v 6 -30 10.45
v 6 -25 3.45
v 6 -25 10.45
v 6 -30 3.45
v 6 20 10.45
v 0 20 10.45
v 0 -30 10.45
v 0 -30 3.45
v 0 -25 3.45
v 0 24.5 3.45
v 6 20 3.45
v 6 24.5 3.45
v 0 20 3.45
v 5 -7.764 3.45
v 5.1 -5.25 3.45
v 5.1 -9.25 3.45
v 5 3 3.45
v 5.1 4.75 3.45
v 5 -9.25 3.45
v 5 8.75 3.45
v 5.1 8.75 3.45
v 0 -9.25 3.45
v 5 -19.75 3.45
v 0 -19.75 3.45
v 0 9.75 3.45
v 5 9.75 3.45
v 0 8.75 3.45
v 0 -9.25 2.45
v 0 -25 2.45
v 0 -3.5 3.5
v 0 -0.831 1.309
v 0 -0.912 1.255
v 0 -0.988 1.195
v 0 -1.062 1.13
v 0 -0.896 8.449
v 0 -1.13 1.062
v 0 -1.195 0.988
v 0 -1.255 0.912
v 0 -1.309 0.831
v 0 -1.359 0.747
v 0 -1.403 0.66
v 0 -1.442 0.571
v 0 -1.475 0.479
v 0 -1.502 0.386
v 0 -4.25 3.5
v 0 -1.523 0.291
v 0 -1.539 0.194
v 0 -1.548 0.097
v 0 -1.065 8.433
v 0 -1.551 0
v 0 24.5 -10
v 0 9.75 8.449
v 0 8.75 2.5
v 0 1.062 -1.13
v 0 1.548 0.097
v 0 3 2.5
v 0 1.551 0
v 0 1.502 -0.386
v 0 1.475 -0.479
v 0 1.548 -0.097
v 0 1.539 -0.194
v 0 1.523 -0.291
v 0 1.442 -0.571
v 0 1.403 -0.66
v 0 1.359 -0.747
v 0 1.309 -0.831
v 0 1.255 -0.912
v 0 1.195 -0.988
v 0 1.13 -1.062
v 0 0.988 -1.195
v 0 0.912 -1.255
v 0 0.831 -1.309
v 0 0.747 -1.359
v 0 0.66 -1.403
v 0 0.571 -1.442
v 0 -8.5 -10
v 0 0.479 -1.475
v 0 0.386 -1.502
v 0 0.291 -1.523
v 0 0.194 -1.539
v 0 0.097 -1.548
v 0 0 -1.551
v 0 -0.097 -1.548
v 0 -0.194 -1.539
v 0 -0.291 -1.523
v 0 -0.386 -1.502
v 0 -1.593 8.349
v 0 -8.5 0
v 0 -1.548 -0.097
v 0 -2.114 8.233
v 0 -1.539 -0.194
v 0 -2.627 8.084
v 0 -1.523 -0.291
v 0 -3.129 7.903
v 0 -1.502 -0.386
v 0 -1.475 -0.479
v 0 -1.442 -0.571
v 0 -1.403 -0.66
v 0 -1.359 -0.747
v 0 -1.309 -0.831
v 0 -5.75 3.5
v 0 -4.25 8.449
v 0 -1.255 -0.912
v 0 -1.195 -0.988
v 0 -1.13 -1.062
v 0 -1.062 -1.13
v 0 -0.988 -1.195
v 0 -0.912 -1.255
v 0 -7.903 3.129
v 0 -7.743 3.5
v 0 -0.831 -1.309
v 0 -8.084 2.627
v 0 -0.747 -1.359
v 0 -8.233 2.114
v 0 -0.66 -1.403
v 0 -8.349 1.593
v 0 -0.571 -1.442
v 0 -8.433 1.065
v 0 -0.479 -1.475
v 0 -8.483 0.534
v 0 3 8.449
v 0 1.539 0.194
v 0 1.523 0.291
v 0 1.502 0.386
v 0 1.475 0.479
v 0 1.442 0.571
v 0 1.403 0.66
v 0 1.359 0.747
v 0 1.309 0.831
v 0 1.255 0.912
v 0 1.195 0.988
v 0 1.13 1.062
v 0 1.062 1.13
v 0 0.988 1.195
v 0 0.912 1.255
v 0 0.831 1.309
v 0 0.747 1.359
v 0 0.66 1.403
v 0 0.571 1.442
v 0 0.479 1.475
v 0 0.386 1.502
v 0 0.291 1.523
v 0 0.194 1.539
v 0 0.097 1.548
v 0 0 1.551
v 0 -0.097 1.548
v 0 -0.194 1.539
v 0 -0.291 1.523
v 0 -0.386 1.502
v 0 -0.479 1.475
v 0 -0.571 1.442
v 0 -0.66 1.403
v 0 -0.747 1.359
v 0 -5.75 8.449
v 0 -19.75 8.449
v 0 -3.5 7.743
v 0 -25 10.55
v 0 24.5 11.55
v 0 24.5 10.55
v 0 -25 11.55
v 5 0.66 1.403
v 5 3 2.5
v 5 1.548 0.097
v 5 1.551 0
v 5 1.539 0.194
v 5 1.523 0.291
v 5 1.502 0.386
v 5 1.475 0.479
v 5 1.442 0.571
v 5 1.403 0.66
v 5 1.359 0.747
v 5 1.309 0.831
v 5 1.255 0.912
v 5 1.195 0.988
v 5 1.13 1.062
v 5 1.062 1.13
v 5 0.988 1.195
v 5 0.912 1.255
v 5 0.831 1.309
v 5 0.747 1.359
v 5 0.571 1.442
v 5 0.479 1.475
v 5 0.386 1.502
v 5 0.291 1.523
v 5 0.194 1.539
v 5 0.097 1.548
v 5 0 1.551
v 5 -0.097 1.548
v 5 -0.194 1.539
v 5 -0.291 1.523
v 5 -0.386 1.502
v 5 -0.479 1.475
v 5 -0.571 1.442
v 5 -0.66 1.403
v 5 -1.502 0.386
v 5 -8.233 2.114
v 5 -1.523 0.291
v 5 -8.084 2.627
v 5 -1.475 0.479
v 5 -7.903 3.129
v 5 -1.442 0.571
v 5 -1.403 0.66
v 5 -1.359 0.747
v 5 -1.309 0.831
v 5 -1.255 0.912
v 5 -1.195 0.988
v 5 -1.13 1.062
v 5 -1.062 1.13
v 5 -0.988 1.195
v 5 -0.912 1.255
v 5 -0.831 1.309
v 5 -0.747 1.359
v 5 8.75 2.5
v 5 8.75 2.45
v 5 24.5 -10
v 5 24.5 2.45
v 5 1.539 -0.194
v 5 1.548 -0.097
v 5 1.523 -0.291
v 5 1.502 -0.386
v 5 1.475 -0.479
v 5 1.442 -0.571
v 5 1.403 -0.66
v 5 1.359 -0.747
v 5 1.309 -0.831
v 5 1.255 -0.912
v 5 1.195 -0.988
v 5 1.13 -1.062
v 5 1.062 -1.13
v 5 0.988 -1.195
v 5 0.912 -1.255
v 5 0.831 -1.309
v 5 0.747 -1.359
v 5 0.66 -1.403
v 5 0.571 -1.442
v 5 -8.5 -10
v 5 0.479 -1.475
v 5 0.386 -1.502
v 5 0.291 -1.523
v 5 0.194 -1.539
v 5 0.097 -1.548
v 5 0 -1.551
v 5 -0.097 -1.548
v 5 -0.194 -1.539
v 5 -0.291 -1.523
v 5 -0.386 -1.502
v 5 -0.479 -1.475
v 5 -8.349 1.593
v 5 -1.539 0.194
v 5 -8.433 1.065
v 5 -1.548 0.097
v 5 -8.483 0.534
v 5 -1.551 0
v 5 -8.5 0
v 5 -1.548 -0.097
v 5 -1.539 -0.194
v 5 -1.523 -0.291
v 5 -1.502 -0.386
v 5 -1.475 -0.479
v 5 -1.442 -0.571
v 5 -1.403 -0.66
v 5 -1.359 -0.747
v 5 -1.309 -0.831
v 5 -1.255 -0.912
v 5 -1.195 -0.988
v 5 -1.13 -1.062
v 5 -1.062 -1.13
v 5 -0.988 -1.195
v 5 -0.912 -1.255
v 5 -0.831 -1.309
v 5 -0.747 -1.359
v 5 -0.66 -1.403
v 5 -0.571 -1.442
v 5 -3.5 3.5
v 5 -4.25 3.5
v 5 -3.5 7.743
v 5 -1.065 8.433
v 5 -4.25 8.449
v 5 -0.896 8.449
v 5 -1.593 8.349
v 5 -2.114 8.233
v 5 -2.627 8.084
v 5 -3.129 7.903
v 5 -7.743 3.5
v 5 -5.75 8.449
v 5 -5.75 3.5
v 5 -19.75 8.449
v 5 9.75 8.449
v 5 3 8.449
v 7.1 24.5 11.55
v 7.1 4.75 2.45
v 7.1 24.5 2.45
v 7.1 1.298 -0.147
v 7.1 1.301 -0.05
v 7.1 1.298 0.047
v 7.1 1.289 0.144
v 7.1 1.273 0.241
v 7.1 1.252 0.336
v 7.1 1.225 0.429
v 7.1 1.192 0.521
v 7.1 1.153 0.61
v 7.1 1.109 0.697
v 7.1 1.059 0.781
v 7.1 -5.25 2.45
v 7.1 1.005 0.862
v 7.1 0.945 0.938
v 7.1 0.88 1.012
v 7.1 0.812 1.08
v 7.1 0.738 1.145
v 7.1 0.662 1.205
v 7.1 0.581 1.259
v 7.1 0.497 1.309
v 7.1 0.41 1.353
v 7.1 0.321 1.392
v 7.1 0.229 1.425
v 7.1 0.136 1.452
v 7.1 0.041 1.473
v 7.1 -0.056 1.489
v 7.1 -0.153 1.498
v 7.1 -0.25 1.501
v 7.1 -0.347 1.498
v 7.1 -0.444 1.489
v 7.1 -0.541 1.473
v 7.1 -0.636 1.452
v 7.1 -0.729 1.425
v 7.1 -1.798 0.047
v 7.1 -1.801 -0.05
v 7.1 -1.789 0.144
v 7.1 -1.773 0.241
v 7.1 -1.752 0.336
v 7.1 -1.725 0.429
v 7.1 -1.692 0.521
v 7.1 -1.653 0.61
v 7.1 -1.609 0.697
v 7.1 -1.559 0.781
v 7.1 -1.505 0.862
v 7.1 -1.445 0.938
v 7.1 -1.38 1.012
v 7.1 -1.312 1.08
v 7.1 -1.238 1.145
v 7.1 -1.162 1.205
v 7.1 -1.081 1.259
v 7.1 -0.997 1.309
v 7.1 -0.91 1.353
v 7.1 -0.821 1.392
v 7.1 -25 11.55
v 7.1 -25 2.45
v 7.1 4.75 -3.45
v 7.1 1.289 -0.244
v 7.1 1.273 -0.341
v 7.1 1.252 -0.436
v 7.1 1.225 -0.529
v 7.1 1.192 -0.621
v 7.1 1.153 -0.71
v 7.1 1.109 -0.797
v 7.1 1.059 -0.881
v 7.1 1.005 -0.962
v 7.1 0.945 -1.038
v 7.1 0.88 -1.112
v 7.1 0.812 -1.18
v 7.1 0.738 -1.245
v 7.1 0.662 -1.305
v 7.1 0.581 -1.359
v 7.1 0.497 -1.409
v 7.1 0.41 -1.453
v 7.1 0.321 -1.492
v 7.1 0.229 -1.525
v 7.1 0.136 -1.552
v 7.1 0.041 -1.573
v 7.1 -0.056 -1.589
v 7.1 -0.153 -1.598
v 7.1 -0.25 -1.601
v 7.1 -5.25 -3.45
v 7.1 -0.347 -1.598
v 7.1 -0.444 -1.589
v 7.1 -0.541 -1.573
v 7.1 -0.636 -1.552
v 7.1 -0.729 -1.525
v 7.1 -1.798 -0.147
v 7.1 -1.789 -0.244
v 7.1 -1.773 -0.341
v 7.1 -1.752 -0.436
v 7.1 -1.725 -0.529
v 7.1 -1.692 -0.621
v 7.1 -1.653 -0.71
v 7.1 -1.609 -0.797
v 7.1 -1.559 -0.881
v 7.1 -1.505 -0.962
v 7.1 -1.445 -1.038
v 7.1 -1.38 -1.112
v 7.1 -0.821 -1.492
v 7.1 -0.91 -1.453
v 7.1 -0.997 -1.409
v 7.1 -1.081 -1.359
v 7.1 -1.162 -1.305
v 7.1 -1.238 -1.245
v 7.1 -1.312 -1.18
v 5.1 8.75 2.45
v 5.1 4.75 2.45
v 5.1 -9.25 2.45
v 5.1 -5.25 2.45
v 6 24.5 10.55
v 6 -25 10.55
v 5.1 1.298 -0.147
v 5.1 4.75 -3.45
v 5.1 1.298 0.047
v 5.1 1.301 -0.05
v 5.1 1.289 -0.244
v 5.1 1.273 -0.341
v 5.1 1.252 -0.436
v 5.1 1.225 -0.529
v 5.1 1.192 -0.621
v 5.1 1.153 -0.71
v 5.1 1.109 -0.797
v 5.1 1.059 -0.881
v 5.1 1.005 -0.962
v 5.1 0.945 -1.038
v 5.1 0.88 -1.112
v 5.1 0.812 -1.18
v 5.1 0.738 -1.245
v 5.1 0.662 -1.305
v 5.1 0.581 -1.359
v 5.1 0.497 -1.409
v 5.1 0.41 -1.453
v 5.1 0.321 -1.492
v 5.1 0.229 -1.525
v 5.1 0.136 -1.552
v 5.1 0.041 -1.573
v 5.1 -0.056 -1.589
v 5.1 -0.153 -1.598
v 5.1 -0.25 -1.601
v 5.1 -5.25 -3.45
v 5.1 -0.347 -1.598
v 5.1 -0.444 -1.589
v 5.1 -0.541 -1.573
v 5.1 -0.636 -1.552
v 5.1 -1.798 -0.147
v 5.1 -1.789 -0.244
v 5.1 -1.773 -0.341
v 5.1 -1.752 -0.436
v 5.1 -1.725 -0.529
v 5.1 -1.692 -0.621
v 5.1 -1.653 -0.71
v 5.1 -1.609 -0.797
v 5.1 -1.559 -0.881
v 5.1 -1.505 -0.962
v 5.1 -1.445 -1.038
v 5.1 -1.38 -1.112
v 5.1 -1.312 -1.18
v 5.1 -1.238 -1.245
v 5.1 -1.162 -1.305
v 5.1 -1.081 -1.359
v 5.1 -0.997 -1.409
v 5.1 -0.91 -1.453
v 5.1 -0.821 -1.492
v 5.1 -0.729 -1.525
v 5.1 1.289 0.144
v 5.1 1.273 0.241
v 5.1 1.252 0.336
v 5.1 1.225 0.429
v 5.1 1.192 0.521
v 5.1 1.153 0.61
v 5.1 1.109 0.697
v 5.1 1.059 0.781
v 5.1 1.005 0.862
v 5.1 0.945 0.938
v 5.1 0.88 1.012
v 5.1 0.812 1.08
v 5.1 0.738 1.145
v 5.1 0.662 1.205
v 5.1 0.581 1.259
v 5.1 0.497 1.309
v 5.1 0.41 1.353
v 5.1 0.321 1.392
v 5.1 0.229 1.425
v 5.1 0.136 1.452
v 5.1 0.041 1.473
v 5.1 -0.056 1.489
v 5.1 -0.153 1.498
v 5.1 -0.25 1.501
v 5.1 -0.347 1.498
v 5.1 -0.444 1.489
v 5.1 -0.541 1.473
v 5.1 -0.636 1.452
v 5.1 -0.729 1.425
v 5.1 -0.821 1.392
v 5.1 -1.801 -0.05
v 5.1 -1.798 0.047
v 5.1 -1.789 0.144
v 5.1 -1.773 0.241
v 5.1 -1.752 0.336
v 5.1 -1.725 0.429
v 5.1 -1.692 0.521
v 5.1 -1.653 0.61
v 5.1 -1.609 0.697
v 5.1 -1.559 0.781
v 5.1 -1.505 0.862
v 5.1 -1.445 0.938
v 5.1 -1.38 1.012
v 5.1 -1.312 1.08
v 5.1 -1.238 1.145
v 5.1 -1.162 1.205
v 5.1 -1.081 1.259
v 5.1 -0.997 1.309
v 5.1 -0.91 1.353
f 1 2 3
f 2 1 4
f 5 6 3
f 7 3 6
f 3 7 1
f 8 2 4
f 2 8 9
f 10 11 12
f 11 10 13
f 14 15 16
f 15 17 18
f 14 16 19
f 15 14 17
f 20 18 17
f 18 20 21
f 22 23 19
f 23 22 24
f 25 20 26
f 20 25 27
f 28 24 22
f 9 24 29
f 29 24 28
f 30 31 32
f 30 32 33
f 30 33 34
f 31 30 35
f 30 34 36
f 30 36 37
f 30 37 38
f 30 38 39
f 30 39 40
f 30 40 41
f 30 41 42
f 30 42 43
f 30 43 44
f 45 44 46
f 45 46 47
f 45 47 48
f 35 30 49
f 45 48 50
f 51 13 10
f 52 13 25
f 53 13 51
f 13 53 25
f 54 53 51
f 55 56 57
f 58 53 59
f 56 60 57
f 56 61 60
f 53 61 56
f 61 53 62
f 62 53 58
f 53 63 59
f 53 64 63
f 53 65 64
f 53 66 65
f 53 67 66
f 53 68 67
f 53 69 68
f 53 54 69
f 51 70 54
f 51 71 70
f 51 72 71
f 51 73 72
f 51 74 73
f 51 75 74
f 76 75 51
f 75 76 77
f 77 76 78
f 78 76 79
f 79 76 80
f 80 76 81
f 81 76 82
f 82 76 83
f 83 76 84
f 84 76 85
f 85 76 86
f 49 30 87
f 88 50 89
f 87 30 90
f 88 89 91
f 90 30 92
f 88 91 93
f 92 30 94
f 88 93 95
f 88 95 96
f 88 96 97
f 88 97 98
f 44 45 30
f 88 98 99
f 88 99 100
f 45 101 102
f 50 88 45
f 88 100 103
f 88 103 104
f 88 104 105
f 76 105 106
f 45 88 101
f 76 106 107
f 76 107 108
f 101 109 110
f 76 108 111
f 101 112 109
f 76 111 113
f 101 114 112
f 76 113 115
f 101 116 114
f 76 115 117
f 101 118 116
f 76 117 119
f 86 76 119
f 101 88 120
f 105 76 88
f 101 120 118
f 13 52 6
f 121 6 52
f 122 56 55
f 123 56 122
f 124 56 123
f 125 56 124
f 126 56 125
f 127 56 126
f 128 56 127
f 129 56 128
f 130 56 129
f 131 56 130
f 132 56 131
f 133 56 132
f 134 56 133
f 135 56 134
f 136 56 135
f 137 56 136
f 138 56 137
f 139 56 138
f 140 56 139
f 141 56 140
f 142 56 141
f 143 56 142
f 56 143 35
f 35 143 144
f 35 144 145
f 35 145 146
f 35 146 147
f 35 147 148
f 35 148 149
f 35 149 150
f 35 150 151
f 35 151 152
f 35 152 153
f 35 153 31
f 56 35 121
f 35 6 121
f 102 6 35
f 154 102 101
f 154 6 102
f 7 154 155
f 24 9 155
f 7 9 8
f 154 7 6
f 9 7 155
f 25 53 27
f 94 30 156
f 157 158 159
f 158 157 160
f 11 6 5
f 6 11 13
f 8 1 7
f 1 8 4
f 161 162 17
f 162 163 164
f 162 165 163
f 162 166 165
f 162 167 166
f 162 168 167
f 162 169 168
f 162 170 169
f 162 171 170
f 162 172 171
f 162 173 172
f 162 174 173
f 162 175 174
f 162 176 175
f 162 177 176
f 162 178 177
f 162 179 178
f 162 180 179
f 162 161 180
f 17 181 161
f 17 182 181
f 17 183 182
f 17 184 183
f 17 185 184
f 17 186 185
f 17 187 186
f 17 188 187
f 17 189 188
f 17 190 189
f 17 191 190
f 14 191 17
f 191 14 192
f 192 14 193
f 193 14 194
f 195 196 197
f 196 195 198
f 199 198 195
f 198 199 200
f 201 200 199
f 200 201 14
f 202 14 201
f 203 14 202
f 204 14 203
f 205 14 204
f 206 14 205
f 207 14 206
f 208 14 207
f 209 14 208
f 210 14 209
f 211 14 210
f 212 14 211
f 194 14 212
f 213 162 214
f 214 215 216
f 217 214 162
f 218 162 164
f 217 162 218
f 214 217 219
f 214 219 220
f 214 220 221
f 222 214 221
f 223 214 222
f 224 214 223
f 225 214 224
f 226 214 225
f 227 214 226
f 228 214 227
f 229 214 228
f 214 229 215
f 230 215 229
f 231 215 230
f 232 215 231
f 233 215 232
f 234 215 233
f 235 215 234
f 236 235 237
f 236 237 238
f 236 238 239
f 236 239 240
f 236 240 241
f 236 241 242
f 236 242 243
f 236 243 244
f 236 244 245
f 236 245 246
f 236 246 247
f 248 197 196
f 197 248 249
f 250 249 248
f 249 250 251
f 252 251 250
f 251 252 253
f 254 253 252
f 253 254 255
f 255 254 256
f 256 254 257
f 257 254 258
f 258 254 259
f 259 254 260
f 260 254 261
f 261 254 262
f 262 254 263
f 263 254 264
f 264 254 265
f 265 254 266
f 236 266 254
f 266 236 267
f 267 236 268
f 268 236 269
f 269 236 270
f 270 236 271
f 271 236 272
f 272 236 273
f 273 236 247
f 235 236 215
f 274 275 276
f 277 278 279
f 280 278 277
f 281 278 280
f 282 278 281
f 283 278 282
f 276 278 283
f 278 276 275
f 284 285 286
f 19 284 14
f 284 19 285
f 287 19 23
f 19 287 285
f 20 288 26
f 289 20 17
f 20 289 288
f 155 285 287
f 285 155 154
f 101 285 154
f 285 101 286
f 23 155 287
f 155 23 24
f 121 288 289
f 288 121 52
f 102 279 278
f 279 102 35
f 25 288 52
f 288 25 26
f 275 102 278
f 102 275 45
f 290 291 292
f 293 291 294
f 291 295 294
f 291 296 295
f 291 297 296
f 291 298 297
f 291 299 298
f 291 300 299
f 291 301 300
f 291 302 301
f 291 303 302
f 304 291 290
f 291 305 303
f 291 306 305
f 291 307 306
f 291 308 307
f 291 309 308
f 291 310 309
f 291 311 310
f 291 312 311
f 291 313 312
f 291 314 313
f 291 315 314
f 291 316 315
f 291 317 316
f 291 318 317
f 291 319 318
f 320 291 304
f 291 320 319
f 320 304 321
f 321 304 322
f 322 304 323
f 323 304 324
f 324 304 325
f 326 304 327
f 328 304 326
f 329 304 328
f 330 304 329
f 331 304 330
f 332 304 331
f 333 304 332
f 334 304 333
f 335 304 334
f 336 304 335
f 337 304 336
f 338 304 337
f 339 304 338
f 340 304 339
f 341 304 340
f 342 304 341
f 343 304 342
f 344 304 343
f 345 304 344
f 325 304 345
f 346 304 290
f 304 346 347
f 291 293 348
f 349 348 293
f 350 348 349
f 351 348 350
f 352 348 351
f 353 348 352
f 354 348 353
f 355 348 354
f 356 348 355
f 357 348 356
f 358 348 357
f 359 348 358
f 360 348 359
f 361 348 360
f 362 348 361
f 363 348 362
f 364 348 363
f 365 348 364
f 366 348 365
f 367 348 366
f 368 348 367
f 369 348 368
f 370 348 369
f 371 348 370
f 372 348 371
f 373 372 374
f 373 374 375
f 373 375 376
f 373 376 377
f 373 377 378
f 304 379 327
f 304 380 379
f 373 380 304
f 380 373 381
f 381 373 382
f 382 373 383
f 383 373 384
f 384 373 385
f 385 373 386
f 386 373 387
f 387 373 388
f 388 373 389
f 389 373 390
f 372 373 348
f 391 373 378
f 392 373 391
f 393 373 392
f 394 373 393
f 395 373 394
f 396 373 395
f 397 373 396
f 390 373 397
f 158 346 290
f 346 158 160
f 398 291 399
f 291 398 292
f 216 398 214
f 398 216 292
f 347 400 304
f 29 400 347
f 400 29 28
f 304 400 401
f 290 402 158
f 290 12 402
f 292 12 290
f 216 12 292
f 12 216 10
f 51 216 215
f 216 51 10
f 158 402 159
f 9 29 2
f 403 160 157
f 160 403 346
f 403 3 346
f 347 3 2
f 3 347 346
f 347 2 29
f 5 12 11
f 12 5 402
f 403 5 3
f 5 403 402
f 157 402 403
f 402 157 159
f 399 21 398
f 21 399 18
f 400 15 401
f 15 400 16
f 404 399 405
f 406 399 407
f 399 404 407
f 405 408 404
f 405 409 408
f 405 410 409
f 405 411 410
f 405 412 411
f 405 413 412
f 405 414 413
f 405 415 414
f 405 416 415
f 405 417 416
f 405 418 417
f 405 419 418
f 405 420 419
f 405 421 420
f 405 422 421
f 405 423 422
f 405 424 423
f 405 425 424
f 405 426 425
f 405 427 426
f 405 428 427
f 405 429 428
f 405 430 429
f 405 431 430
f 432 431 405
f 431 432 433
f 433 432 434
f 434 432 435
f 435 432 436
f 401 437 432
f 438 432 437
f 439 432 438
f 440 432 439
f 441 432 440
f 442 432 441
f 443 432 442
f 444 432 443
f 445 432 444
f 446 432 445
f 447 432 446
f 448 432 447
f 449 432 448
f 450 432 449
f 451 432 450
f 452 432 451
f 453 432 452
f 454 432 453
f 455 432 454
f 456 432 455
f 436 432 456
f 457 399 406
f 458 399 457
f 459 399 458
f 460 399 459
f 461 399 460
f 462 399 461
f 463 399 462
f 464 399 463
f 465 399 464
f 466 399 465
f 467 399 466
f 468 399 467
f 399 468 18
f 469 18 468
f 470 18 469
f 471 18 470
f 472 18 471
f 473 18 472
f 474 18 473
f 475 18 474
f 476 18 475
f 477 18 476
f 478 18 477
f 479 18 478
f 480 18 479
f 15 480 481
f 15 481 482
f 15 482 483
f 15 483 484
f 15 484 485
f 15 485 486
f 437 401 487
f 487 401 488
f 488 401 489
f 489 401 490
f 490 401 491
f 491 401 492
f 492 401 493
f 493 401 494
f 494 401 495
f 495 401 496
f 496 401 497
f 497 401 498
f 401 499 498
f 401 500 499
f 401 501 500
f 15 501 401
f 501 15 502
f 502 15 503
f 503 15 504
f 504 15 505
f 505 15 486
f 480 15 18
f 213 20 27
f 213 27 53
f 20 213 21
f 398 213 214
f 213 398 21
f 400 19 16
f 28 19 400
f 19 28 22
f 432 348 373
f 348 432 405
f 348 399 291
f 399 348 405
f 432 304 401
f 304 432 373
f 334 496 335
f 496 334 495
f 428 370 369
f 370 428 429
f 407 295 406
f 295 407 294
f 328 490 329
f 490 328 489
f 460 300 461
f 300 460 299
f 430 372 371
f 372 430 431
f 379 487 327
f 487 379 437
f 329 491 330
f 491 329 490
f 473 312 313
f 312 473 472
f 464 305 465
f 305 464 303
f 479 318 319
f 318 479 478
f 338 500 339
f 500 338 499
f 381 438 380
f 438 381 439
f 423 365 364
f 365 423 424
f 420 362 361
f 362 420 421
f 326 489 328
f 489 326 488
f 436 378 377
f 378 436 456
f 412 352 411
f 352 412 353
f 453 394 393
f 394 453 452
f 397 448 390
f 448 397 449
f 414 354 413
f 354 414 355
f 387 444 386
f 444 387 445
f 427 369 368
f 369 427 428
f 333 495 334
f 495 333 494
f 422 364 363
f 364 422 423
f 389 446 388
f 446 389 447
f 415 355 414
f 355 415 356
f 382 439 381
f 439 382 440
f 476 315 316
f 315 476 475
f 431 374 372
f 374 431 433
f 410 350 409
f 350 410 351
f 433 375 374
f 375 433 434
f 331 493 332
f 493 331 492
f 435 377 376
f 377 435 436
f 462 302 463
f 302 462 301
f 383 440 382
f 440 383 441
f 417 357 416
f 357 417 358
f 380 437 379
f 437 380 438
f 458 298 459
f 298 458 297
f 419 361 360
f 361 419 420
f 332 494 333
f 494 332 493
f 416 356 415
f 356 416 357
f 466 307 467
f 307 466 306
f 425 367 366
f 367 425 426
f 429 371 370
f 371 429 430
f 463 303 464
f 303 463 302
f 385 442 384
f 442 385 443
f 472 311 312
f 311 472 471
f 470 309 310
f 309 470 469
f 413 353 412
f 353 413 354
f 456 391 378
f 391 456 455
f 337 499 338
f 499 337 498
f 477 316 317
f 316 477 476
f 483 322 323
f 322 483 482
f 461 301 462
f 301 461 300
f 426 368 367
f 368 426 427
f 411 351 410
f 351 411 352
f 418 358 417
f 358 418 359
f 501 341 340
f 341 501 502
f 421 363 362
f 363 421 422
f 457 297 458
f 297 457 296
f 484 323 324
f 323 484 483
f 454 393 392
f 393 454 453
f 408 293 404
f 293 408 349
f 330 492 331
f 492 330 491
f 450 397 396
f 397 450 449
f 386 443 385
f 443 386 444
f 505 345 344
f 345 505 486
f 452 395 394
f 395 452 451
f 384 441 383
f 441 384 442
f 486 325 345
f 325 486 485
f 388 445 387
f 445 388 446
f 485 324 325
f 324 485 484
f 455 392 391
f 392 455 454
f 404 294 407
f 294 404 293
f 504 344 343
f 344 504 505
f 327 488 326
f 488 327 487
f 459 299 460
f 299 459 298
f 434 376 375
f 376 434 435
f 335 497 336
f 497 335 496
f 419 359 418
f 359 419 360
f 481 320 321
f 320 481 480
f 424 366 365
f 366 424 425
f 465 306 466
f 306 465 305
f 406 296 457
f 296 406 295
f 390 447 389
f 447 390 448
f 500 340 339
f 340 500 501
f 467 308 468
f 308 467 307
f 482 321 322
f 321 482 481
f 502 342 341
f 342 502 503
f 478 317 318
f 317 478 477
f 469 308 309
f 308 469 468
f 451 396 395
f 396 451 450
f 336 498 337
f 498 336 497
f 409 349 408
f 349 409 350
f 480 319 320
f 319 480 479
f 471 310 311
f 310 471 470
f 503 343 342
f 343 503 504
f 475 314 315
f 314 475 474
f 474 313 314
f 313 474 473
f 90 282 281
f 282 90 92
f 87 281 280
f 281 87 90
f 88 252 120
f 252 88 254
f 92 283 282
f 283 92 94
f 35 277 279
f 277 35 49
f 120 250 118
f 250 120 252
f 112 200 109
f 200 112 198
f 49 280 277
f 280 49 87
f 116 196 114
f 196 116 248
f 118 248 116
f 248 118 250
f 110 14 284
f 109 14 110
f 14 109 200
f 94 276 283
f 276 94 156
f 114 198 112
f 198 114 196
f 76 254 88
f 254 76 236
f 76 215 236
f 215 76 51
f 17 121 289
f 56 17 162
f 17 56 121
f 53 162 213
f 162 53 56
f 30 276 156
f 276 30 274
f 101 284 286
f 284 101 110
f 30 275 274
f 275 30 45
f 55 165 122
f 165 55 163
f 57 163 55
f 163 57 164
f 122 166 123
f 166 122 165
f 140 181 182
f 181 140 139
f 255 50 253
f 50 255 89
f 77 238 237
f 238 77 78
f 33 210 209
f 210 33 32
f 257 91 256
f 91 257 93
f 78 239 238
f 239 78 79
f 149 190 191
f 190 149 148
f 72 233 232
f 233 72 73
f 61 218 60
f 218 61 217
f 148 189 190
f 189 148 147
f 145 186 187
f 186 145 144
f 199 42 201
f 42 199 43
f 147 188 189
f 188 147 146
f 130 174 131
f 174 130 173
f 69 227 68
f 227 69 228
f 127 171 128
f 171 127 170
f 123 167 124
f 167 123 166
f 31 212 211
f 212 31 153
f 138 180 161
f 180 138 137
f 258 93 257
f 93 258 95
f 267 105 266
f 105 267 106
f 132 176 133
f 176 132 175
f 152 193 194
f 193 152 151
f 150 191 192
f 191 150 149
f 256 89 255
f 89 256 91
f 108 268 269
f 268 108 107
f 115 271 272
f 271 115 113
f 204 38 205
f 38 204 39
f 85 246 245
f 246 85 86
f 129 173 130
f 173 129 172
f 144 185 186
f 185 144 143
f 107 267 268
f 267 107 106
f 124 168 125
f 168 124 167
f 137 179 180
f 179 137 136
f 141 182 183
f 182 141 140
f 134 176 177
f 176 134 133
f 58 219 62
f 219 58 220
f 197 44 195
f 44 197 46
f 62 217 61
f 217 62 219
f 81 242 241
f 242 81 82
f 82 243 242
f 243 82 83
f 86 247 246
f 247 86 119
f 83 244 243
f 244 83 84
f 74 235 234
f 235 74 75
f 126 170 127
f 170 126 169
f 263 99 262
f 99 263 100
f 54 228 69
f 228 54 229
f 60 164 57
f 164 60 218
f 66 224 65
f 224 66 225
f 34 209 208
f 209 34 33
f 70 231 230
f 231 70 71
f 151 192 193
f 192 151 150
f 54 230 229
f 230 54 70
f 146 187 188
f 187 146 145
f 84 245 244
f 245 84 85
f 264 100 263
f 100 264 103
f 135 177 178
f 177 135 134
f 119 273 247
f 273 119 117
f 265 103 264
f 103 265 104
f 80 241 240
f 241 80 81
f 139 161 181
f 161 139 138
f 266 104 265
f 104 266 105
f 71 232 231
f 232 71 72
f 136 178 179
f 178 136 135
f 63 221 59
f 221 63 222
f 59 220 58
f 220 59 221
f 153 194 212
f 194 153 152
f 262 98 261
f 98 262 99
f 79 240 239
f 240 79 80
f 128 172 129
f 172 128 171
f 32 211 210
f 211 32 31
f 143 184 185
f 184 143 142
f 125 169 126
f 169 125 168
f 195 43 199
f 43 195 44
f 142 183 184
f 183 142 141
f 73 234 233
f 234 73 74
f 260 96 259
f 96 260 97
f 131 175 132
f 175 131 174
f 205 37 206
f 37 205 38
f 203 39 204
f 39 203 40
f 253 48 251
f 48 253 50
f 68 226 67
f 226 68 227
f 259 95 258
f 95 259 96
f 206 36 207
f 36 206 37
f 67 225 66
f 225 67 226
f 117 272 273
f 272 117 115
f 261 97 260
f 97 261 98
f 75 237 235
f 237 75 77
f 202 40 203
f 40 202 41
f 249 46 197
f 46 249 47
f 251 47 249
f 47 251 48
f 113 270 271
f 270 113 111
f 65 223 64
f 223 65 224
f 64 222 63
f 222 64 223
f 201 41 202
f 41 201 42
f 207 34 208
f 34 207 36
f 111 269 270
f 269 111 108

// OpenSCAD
TOGGLE_LENGTH = 50;
TOGGLE_HEIGHT = 7;
TOGGLE_WIDTH = 6;
TOGGLE_SLOT_HEIGHT = 5;
TOGGLE_SLOT_WIDTH = 14;
TOGGLE_SLOT_DISTANCE = 1.5;

MOUNT_HEIGHT = 15;
MOUNT_WIDTH = TOGGLE_SLOT_WIDTH * 2 + TOGGLE_SLOT_DISTANCE + 2 * 10;
MOUNT_WALL_THICKNESS = 1;
MOUNT_MIDDLE_THICKNESS = 10;
MOUNT_EXTRA_SPACE=0.1;
MOUNT_HOLE_RADIUS = 3.1 / 2;

PROBE_WIDTH = 5;
PROBE_ACTIVATION_AREA_RADIUS = 8.5;
PROBE_ACTIVE_FLAT_AREA_WIDTH = 10;
PROBE_INACTIVE_FLAT_AREA_WIDTH = 3;
PROBE_HEIGHT = 33;
PROBE_SLOT_WIDTH = PROBE_ACTIVATION_AREA_RADIUS * 2 + 1;

//TODO: Solve the wavy short line
//Front and top can have the same long straight line
//no rounded corner angles matters, so the model can be simplified
//The housing needs to come out so that the probe can actually touch it
//
//

module hole(h, r, center, fn=100)
{
   fudge = 1/cos(180/fn);
   cylinder(h=h,r=r*fudge,center=center,$fn=fn);
}

module toggle()
{
	difference()
	{
		cube([TOGGLE_WIDTH, TOGGLE_LENGTH, TOGGLE_HEIGHT]);
		translate([-0.1, TOGGLE_LENGTH / 2 - TOGGLE_SLOT_WIDTH - TOGGLE_SLOT_DISTANCE / 2, -0.001])
		cube([PROBE_WIDTH + 0.1, TOGGLE_SLOT_WIDTH, TOGGLE_SLOT_HEIGHT]);
		translate([-0.1, TOGGLE_LENGTH / 2 + TOGGLE_SLOT_DISTANCE / 2, -0.001])
		cube([PROBE_WIDTH + 0.1, TOGGLE_SLOT_WIDTH, TOGGLE_SLOT_HEIGHT]);
	}
}

module probe()
{
	$fn = 100;
	difference()
	{
		union()
		{
			difference()
			{
				cylinder(h = PROBE_WIDTH, r = PROBE_ACTIVATION_AREA_RADIUS, center=true);
				translate([(PROBE_ACTIVATION_AREA_RADIUS + 0.1) / 2, 0, 0])
				cube([PROBE_ACTIVATION_AREA_RADIUS + 0.1, 2 * PROBE_ACTIVATION_AREA_RADIUS + 0.1, PROBE_WIDTH + 0.1], center=true);
			}
			translate([-PROBE_ACTIVATION_AREA_RADIUS / 2, -PROBE_ACTIVE_FLAT_AREA_WIDTH / 2, 0])
			cube([PROBE_ACTIVATION_AREA_RADIUS, PROBE_ACTIVE_FLAT_AREA_WIDTH, PROBE_WIDTH], center=true);

			translate([PROBE_INACTIVE_FLAT_AREA_WIDTH / 2, PROBE_ACTIVATION_AREA_RADIUS / 2, 0])
			cube([PROBE_INACTIVE_FLAT_AREA_WIDTH, PROBE_ACTIVATION_AREA_RADIUS, PROBE_WIDTH], center=true);
			probe_top_width = PROBE_ACTIVE_FLAT_AREA_WIDTH + (PROBE_ACTIVATION_AREA_RADIUS - TOGGLE_SLOT_HEIGHT);
			translate([
				(PROBE_HEIGHT - PROBE_ACTIVATION_AREA_RADIUS) / 2,
				-probe_top_width / 2 + PROBE_ACTIVATION_AREA_RADIUS - TOGGLE_SLOT_HEIGHT - MOUNT_WALL_THICKNESS / 2,
				0])
			cube([PROBE_HEIGHT - PROBE_ACTIVATION_AREA_RADIUS, probe_top_width - MOUNT_WALL_THICKNESS, PROBE_WIDTH], center=true);
		}
		translate([-PROBE_ACTIVATION_AREA_RADIUS + TOGGLE_SLOT_HEIGHT / 2, PROBE_ACTIVATION_AREA_RADIUS - TOGGLE_SLOT_HEIGHT / 2, 0])
		cube([TOGGLE_SLOT_HEIGHT, TOGGLE_SLOT_HEIGHT, PROBE_WIDTH + 0.1], center=true);
		hole(r = MOUNT_HOLE_RADIUS, h=PROBE_WIDTH + 0.1, center=true);
	}
}

module mount()
{
	difference()
	{
		translate([0, 0, -MOUNT_WALL_THICKNESS])
		cube([TOGGLE_WIDTH + MOUNT_WALL_THICKNESS + MOUNT_EXTRA_SPACE, MOUNT_WIDTH, TOGGLE_HEIGHT + 2*MOUNT_WALL_THICKNESS + MOUNT_EXTRA_SPACE]);
		translate([-0.1 - MOUNT_EXTRA_SPACE, -0.1, 0])
		cube([TOGGLE_WIDTH+MOUNT_EXTRA_SPACE + 0.1, MOUNT_WIDTH + 0.2, TOGGLE_HEIGHT + MOUNT_EXTRA_SPACE]);

		translate([-MOUNT_WALL_THICKNESS-0.1, MOUNT_WIDTH / 2 - PROBE_SLOT_WIDTH / 2, -MOUNT_WALL_THICKNESS-0.1])
		cube([TOGGLE_WIDTH + MOUNT_EXTRA_SPACE + 0.1, PROBE_SLOT_WIDTH, MOUNT_WALL_THICKNESS + 0.2]);
		
	}
	difference()
	{
		pole_height = MOUNT_HEIGHT - (TOGGLE_HEIGHT + MOUNT_WALL_THICKNESS + MOUNT_EXTRA_SPACE);
		translate([PROBE_WIDTH + MOUNT_EXTRA_SPACE, MOUNT_WIDTH / 2 - MOUNT_MIDDLE_THICKNESS / 2, -pole_height])
		cube([MOUNT_WALL_THICKNESS + (TOGGLE_WIDTH - PROBE_WIDTH), MOUNT_MIDDLE_THICKNESS, pole_height]);
		
		translate([-0.1, MOUNT_WIDTH / 2, TOGGLE_SLOT_HEIGHT - PROBE_ACTIVATION_AREA_RADIUS])
		rotate([0, 90, 0])
		hole(r=MOUNT_HOLE_RADIUS, h = TOGGLE_WIDTH + MOUNT_WALL_THICKNESS + MOUNT_EXTRA_SPACE + 0.2);
	}
}

module original_probe()
{
	rotate([0, 0, 90])
	import("Probe_1013_Toggle.stl");
}

module assembly()
{
	translate([0, -TOGGLE_LENGTH / 2, TOGGLE_SLOT_HEIGHT - MOUNT_HOLE_RADIUS])
	{
		translate([0, -5, 0])
		toggle();
		mount();
	}

	rotate([90, 0, 0])
	translate([PROBE_WIDTH / 2, 0, 0])
	rotate([0, 90, 0])
	{
		probe();
	}
}

assembly();
